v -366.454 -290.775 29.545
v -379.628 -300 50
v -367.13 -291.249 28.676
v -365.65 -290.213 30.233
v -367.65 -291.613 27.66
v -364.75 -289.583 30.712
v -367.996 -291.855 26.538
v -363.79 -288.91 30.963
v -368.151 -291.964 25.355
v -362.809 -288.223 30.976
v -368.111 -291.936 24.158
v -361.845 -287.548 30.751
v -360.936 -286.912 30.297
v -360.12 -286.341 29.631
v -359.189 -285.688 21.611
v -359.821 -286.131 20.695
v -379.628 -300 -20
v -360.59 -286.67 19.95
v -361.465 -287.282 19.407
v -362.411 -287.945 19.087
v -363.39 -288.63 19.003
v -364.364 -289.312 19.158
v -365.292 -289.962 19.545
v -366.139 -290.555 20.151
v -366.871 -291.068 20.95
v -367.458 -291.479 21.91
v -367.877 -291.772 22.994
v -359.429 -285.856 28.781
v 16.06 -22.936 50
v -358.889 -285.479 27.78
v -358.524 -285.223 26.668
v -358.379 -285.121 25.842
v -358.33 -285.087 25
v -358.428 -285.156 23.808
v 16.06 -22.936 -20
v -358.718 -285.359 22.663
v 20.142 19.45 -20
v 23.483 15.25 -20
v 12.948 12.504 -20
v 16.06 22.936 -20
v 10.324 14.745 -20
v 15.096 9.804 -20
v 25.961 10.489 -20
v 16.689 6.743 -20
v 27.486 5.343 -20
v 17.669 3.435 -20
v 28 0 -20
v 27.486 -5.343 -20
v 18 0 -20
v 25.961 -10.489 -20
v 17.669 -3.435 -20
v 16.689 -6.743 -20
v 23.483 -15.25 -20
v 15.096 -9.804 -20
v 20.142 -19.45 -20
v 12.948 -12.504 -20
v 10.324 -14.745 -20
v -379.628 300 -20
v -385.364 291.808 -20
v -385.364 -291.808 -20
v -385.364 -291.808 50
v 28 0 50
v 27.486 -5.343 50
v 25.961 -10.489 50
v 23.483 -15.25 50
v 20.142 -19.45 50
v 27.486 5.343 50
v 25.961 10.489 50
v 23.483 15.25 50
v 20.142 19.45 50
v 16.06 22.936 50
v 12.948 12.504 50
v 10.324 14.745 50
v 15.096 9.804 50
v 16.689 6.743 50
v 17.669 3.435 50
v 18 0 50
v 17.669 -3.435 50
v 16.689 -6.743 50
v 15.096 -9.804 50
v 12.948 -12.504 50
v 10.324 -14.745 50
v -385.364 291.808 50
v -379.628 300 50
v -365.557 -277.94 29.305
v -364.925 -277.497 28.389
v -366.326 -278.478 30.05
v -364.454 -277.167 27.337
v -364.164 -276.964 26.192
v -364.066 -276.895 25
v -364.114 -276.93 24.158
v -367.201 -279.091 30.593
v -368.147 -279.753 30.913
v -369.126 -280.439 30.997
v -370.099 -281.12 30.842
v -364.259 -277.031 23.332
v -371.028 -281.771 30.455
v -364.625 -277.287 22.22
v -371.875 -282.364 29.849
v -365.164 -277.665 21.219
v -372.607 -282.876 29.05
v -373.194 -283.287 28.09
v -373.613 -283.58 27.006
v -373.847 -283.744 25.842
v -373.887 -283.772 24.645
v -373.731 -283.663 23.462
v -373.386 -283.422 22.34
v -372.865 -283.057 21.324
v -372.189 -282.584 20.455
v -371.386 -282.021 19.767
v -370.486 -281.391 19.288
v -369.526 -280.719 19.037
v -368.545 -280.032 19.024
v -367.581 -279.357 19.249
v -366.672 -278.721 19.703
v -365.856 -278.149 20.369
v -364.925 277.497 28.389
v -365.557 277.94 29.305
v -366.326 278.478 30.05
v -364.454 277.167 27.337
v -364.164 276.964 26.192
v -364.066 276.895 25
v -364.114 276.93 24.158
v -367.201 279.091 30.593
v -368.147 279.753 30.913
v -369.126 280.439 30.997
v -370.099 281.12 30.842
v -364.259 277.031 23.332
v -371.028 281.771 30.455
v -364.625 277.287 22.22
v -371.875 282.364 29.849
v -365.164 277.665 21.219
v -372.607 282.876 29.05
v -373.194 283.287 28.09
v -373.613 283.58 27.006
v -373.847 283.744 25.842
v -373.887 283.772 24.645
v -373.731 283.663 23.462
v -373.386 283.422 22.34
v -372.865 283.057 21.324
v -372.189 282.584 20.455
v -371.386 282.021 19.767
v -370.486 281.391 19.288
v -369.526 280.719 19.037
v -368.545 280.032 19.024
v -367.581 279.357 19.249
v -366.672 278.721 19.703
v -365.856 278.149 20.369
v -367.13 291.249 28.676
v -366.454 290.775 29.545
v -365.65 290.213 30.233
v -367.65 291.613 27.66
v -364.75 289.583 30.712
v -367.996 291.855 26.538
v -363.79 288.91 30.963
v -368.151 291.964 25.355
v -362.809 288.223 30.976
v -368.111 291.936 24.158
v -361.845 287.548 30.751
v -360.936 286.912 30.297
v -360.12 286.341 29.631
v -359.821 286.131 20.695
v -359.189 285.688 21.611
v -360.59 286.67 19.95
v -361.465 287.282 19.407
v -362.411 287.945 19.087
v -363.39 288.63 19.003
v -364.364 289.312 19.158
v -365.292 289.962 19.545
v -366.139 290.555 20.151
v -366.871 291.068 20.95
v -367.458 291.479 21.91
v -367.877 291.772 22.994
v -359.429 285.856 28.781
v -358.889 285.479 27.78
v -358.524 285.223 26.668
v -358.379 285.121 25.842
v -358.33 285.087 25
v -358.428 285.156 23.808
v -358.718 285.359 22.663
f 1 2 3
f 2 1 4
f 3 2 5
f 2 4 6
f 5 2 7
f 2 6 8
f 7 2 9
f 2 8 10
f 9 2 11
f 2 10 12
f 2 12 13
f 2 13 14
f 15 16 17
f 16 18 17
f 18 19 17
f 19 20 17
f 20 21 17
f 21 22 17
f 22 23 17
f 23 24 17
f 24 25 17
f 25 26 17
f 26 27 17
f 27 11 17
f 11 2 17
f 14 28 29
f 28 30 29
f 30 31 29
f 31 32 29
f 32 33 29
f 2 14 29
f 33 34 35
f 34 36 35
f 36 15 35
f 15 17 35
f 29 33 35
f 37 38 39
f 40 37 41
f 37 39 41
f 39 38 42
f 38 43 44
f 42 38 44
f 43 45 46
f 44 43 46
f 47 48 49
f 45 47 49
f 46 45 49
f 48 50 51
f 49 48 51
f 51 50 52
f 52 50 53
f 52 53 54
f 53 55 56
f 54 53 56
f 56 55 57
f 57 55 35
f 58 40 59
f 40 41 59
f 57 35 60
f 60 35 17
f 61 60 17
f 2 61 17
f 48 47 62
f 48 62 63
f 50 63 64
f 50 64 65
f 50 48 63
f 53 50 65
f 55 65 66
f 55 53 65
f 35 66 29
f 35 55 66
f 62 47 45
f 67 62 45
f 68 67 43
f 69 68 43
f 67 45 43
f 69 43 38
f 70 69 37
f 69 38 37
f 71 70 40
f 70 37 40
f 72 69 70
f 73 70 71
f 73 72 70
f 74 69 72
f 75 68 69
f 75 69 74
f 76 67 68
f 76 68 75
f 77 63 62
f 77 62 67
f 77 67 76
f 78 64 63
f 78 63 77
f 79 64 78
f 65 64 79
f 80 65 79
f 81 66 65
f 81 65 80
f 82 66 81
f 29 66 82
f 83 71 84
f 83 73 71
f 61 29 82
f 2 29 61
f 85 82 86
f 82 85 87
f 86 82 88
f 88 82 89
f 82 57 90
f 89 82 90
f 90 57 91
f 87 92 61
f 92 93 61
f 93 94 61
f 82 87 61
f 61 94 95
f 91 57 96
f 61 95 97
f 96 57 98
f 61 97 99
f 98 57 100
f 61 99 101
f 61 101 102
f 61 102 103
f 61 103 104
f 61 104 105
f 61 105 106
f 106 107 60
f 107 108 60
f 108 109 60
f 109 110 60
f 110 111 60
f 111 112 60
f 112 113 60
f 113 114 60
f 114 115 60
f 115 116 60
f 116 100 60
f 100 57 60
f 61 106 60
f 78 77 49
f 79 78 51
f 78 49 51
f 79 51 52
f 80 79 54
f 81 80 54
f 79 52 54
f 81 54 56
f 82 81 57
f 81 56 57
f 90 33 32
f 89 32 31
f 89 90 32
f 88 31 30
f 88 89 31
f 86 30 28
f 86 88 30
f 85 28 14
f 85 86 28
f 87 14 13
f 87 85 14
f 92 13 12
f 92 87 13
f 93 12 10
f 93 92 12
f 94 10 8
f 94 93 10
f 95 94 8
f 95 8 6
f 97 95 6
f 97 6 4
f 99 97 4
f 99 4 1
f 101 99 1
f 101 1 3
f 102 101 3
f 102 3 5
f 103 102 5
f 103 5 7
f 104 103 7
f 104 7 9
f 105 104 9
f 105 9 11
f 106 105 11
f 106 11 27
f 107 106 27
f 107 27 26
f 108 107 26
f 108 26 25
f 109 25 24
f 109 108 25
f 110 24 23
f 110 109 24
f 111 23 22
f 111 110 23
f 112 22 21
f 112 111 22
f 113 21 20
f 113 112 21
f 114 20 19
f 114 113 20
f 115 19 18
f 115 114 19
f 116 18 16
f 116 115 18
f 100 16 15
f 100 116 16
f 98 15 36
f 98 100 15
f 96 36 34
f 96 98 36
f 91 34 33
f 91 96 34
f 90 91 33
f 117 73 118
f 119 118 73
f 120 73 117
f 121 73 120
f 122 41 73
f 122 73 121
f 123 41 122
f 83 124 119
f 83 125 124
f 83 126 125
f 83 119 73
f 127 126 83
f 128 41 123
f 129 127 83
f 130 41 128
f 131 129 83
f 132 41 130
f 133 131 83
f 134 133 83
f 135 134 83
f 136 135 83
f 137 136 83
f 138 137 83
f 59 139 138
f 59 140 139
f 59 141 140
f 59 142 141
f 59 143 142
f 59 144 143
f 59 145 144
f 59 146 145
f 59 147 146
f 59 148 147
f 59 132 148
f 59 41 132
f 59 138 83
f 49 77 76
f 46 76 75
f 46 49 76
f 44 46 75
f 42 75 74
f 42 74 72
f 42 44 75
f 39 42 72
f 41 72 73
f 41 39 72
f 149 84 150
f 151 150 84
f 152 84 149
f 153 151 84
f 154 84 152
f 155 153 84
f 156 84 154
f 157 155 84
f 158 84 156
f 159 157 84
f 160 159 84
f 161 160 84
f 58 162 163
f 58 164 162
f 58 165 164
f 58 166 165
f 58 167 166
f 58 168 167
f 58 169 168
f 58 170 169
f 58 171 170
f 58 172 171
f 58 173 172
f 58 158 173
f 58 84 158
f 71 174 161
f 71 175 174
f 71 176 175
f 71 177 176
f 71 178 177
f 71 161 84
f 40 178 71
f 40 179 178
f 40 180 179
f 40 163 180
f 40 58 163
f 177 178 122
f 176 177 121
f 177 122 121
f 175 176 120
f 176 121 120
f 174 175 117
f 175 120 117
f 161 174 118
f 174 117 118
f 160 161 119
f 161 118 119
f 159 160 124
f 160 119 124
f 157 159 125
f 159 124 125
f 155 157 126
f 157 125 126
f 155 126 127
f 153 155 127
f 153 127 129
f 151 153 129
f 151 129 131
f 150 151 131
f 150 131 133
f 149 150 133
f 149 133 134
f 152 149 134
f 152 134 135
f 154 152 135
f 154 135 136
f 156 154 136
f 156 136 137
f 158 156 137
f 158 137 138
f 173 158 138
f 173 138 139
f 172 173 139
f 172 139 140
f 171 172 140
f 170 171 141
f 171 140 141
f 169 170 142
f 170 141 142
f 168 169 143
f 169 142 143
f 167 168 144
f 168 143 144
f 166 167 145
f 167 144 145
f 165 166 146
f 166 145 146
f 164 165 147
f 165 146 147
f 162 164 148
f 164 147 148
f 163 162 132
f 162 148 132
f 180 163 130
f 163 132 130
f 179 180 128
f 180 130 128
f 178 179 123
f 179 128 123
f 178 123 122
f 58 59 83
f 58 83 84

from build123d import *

# Parameters (mm, degrees)
PAD002_DEPTH           = 70
SKETCH006_R            = 6
POCKET002_DEPTH        = 30
SKETCH007_R            = 6
POCKET003_DEPTH        = 243.806754
LINEARPATTERN001_COUNT = 4
LINEARPATTERN001_PITCH = 140


with BuildPart() as part:
    # Sketch004 → Pad002 (new body)
    with BuildSketch(Plane.XY):
        with BuildLine():
            Line((-379.627892, 300), (16.06014, 22.936257))
            ThreePointArc((28, 0), (24.836303, 12.928961), (16.06014, 22.936257))
            Line((18, 0), (28, 0))
            ThreePointArc((18, 0), (15.966195, 8.311475), (10.324376, 14.744737))
            Line((10.324376, 14.744737), (-385.363656, 291.80848))
            Line((-385.363656, 291.80848), (-379.627892, 300))
        make_face()
    extrude(amount=PAD002_DEPTH)

    # Sketch006 → Pocket002 (cut)
    with BuildSketch(Plane(origin=(0, 126.75, 0), x_dir=(-1, 0, 0), z_dir=(0, 1, 0))):
        with Locations((26.740569, 25.24131)):
            Circle(SKETCH006_R)
    extrude(amount=-POCKET002_DEPTH, mode=Mode.SUBTRACT)

    # Sketch007 (on Face2 of Pocket002) → Pocket003 (cut, through all)
    with BuildSketch(Plane(origin=(10.324376, 14.744737, 0), x_dir=(0.819152, -0.573576, 0), z_dir=(-0.573576, -0.819152, 0))):
        with Locations((-463.045894, 45)):
            Circle(SKETCH007_R)
    pocket003 = extrude(amount=-POCKET003_DEPTH, mode=Mode.SUBTRACT)

    # LinearPattern001: Pocket003 ×4
    with Locations(*[Vector(-0.819152, 0.573576, 0) * (i * LINEARPATTERN001_PITCH) for i in range(1, LINEARPATTERN001_COUNT)]):
        add(pocket003, mode=Mode.SUBTRACT)

    # Mirrored001: part across XZ


with BuildPart() as part_1:
    add(part.part)
    add(part.part.mirror(Plane.XZ))


with BuildPart() as part_2:
    # Body001 placement: moved
    add(part_1.part.moved(Location((0, 0, -20))))


solid = part_2.part
